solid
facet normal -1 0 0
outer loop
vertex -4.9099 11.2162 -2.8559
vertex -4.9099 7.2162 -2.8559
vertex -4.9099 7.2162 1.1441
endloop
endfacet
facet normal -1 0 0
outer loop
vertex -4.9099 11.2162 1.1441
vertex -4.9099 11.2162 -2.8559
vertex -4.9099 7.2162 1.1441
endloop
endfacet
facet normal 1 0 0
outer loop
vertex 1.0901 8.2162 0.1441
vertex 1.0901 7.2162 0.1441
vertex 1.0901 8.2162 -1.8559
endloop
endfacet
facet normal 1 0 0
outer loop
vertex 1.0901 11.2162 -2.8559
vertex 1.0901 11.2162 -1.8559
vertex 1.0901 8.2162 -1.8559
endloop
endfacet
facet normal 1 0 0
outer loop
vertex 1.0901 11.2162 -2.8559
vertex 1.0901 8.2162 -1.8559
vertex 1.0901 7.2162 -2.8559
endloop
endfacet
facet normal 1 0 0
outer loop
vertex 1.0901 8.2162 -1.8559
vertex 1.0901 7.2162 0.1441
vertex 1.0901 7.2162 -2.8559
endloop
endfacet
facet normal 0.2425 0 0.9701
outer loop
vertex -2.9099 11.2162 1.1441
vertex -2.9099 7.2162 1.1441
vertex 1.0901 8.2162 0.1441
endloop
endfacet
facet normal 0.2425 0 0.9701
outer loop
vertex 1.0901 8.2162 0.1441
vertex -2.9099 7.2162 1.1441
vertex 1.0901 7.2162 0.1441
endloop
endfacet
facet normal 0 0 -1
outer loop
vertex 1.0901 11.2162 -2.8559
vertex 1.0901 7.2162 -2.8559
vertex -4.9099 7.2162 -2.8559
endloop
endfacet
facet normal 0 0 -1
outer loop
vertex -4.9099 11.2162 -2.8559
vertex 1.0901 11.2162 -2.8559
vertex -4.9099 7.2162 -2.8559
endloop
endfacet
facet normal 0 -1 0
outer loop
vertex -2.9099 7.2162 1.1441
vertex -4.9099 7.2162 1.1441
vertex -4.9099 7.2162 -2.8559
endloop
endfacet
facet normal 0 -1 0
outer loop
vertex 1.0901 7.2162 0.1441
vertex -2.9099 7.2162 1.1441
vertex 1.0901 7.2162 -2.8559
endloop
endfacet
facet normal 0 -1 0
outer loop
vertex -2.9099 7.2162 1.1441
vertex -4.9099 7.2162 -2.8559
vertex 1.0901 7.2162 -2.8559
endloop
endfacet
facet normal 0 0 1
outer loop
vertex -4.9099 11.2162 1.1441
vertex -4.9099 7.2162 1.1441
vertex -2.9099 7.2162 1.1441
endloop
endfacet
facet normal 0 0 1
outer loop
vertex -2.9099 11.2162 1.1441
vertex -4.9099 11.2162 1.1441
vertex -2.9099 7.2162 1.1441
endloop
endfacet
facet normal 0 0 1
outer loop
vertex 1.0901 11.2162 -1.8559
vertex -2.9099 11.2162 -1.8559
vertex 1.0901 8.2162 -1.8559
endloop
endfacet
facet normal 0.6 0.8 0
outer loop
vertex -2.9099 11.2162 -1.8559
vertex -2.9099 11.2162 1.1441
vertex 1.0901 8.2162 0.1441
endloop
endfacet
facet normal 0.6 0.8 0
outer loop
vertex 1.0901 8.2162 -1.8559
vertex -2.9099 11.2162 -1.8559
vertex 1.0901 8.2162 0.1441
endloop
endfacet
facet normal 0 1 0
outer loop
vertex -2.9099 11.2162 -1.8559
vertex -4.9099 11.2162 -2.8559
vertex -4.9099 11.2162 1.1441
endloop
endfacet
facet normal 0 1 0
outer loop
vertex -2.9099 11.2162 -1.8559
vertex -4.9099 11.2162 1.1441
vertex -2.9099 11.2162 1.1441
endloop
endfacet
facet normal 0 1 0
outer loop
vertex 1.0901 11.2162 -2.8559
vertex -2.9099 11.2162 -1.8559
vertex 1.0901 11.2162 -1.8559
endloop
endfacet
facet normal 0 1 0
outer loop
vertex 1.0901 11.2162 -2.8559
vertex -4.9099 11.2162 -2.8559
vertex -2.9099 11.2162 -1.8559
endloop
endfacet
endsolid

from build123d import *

# Parameters (mm, degrees)
EXTRUDE_1_DEPTH     = 20
EXTRUDE_2_DEPTH     = 20
CUT_EXTRUDE_1_DEPTH = 15
SCALE_1_SCALE       = 0.2


with BuildPart() as part:
    # 草圖1 → 填料-伸長1 (new body)
    with BuildSketch(Plane(origin=(0, 0, 0), x_dir=(1, 0, 0), z_dir=(0, 1, 0))):
        Polygon((-5, 5), (-5, -10), (15, -5), (15, 5), align=None)
    extrude(amount=EXTRUDE_1_DEPTH)

    # 草圖1<3> → 填料-伸長2 (add)
    with BuildSketch(Plane(origin=(0, 0, 0), x_dir=(1, 0, 0), z_dir=(0, 1, 0))):
        Polygon((-15, -10), (-5, -10), (-5, 5), (15, 5), (15, 10), (-15, 10), align=None)
    extrude(amount=EXTRUDE_2_DEPTH)

    # 草圖2 → 除料-伸長1 (cut)
    with BuildSketch(Plane.XY.offset(10)):
        Polygon((-5, 20), (15, 5), (15, 20), align=None)
    extrude(amount=-CUT_EXTRUDE_1_DEPTH, mode=Mode.SUBTRACT)


with BuildPart() as part_1:
    # 縮放比例1: scaled about (-2.387387387, 9.02027027, -1.06981982)
    add(part.part.scale(SCALE_1_SCALE).moved(Location((-1.90990991, 7.216216216, -0.855855856))))


solid = part_1.part
